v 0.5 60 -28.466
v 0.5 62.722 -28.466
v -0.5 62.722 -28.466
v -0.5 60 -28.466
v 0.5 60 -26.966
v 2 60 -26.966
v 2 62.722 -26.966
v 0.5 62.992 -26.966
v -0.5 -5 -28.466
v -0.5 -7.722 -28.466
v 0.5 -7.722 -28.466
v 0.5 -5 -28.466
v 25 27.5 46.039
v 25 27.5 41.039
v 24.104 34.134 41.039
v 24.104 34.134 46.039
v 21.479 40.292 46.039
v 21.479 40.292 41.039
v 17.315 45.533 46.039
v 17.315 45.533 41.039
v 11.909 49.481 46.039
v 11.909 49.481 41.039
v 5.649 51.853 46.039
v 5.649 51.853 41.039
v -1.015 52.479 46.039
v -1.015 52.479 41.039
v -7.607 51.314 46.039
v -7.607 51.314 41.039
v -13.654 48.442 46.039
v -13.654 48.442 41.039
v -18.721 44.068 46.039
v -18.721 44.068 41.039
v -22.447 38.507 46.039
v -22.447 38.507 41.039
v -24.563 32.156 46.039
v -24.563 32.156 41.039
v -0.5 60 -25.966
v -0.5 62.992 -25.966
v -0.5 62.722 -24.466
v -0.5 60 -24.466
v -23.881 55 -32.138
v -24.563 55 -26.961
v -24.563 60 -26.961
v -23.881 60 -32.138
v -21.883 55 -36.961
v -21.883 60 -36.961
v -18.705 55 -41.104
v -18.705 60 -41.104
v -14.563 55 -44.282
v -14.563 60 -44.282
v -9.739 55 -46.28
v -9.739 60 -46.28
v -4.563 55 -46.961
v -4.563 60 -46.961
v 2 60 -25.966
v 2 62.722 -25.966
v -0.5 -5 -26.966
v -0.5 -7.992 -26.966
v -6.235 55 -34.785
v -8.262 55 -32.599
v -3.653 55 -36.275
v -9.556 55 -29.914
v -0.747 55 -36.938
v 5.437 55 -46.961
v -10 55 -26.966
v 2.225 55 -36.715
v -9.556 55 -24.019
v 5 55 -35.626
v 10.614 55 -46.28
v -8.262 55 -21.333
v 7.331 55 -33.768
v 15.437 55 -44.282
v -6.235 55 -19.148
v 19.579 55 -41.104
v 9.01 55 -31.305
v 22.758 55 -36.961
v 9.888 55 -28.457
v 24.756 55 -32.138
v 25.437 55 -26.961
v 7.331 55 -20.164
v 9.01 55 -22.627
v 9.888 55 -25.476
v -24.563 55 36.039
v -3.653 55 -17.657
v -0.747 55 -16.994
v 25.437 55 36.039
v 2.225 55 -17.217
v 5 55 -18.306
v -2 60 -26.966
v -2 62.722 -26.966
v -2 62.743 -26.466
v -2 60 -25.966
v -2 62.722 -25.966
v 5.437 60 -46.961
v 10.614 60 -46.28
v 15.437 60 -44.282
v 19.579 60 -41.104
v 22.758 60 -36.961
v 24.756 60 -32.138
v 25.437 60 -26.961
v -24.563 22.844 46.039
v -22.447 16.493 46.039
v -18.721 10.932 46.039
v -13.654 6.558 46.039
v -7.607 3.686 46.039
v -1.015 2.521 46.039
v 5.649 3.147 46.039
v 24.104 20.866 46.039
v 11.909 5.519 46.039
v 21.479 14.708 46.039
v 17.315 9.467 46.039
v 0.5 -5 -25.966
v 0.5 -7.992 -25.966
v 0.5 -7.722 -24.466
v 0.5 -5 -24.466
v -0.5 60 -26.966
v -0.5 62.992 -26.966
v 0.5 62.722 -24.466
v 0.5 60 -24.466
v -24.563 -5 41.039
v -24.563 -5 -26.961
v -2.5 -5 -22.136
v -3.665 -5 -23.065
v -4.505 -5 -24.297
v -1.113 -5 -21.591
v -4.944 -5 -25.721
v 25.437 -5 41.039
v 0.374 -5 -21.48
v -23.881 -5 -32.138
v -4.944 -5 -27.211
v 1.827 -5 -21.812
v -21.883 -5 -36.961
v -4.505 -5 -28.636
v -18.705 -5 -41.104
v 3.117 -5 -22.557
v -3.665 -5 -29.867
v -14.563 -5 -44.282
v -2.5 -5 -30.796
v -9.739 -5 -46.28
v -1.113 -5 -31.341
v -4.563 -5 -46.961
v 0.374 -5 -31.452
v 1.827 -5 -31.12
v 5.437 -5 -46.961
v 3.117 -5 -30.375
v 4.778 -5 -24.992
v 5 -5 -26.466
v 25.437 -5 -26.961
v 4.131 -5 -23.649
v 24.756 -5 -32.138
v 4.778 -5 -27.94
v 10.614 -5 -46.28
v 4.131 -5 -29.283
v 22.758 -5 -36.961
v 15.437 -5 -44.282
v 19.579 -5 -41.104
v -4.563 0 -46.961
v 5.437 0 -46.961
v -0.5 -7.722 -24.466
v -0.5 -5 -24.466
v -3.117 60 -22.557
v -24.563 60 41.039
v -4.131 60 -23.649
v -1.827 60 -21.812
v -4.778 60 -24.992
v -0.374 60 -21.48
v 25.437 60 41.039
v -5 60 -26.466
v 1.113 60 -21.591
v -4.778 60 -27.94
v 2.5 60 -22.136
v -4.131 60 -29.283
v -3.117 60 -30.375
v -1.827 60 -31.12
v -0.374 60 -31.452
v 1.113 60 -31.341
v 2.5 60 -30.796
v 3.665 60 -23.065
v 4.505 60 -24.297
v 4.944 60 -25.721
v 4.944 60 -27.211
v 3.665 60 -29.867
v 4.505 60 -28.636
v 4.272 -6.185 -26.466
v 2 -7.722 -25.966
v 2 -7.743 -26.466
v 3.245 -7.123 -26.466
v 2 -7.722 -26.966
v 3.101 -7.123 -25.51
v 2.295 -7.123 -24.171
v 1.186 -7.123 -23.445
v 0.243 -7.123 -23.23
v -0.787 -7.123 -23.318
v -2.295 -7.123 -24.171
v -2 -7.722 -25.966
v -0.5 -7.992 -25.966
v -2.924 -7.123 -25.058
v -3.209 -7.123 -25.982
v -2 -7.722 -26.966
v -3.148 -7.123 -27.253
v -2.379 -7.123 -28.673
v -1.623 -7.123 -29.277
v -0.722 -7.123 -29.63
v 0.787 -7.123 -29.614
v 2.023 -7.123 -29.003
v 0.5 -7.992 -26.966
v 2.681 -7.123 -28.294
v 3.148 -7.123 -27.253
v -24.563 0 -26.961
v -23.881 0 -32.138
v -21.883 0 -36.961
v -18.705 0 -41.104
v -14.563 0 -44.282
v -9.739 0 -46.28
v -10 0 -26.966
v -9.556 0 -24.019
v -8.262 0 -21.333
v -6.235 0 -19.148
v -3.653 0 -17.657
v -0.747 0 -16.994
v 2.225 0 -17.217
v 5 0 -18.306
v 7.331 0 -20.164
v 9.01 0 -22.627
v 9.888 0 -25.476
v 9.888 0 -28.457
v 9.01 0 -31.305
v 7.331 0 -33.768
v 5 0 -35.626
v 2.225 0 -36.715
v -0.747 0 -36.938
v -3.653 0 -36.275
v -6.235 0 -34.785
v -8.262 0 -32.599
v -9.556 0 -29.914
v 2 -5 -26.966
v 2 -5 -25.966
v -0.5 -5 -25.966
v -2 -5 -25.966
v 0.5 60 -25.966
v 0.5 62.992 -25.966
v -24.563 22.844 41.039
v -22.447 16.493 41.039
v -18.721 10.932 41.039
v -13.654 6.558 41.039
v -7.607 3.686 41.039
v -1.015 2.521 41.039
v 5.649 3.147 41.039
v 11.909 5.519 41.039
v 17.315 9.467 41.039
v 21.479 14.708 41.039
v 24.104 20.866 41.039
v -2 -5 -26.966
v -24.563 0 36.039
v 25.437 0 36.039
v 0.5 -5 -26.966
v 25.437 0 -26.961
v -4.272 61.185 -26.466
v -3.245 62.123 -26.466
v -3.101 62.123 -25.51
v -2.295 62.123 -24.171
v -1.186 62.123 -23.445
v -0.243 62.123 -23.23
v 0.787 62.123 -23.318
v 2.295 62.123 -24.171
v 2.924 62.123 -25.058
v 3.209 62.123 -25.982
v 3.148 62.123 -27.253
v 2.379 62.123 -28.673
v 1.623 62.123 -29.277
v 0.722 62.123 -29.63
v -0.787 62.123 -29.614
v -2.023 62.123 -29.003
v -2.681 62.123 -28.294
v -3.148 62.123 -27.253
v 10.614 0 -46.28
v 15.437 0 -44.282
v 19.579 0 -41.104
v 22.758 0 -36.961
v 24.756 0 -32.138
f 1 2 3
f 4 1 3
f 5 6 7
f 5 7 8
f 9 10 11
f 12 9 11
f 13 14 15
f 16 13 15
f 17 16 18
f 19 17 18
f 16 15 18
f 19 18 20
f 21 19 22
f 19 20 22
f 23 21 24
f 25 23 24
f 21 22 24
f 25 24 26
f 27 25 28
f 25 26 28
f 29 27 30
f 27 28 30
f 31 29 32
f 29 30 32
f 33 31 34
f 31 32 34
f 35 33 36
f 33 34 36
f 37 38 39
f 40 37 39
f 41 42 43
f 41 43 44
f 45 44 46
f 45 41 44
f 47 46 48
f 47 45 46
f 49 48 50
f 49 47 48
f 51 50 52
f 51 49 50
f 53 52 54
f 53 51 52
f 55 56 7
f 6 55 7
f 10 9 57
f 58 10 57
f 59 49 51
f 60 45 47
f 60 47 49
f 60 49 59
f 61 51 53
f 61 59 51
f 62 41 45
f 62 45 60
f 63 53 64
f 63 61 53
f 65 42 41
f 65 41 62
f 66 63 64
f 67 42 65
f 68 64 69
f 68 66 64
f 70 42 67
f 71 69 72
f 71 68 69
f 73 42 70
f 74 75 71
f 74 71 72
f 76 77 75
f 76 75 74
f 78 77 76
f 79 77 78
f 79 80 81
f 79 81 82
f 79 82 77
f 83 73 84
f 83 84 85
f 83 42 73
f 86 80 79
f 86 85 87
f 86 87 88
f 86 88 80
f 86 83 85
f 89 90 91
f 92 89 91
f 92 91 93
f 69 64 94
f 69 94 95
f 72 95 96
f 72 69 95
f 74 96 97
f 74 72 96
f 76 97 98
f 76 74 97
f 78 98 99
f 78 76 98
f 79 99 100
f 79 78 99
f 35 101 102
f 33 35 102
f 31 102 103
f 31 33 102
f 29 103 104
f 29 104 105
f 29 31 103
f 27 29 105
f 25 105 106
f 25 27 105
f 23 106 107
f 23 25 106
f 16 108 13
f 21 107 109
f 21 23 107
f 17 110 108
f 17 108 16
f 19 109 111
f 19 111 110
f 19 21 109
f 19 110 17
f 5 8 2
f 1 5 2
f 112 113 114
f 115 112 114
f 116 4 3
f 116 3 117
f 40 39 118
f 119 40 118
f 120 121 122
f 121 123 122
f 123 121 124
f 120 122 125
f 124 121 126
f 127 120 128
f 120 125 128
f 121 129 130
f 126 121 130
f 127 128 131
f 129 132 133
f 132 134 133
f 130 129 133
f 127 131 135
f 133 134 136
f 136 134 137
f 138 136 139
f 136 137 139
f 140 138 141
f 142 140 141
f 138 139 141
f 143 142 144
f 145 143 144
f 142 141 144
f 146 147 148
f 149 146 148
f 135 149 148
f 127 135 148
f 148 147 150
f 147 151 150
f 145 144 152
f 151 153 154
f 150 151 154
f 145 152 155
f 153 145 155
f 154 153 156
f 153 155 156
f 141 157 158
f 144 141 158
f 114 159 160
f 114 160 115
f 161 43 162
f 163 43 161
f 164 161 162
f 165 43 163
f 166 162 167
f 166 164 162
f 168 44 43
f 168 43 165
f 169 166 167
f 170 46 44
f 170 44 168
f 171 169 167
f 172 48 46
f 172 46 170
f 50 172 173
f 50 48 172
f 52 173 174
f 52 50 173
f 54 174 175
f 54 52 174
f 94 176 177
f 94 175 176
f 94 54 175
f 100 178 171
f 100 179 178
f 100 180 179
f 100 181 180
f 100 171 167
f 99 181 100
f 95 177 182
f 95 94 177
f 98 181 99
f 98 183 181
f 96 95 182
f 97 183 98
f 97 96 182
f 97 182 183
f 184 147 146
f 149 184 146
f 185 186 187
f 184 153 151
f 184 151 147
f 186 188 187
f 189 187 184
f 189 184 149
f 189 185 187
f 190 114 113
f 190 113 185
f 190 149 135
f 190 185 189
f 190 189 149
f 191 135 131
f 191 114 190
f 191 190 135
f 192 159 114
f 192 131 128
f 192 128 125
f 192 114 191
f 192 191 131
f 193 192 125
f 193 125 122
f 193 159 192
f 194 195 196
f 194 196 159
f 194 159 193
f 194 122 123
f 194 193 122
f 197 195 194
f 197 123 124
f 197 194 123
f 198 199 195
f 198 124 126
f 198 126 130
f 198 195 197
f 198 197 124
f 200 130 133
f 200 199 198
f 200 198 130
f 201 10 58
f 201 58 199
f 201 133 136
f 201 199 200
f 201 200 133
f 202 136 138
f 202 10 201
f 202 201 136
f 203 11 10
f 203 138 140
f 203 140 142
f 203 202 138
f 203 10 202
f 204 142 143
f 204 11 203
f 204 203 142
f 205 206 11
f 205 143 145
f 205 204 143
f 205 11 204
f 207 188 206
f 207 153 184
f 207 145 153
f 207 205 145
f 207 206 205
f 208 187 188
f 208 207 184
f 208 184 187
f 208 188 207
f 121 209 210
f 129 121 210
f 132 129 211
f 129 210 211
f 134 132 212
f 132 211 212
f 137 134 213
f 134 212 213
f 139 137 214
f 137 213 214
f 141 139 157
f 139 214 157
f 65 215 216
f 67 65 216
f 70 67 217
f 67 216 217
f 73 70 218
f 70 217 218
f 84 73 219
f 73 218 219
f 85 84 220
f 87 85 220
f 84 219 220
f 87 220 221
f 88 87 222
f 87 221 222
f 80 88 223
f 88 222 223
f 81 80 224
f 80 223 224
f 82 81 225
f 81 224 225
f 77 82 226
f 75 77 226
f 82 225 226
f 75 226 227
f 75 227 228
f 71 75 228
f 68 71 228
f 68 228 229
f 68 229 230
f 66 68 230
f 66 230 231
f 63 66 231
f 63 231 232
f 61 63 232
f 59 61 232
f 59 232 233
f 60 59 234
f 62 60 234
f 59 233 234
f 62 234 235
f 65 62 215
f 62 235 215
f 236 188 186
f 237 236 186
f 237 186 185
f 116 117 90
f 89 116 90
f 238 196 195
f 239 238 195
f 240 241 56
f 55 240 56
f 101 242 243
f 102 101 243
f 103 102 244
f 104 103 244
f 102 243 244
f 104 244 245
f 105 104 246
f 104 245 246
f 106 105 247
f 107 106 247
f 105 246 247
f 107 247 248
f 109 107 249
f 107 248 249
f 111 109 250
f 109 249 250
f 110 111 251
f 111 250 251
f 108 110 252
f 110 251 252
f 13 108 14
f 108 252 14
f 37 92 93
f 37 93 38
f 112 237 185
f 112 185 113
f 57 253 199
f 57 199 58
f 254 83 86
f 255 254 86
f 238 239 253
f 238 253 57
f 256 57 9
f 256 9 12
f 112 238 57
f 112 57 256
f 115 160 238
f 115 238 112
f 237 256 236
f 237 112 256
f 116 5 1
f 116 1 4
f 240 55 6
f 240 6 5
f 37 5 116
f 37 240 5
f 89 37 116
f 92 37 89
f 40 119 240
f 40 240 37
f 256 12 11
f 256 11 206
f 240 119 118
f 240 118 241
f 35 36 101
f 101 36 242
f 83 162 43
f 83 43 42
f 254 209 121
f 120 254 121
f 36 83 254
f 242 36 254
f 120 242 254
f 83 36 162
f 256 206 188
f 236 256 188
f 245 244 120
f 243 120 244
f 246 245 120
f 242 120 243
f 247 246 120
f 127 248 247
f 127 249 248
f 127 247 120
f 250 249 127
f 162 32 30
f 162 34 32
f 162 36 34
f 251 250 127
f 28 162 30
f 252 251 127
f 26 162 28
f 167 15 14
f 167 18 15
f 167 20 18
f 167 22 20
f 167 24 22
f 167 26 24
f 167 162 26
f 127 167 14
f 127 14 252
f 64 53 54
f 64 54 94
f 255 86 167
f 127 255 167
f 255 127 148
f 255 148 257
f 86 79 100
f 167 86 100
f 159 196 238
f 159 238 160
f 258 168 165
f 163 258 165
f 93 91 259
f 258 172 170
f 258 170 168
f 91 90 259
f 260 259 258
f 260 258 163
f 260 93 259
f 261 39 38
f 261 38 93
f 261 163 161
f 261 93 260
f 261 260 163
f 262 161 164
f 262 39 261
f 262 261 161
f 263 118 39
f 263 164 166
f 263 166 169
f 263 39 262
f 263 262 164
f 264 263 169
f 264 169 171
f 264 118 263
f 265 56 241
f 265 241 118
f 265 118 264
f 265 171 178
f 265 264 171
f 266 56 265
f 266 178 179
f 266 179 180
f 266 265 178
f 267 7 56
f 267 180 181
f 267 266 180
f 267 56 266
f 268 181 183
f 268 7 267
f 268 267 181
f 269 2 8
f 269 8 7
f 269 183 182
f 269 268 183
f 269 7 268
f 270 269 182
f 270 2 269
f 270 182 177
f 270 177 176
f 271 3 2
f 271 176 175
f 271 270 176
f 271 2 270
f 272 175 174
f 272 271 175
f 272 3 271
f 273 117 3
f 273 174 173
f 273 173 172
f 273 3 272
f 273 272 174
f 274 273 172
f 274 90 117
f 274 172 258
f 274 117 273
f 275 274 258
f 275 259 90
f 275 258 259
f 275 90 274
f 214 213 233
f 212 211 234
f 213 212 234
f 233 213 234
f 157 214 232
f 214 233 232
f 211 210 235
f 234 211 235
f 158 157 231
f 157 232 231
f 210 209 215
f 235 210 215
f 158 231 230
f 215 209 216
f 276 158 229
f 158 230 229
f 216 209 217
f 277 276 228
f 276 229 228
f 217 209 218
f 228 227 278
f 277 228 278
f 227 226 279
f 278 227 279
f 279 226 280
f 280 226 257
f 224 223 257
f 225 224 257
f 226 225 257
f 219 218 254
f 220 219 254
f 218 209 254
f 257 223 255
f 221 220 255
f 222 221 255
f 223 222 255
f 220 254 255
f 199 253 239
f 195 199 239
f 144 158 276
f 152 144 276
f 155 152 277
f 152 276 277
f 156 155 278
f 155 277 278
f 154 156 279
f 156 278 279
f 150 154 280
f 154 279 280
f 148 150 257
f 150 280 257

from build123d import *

# Parameters (mm, degrees)
F1_DEPTH  = 5
F2_W      = 50
F2_H      = 55
F2_H_2    = 5
F3_DEPTH  = 5
F7_DEPTH  = 5
F8_R      = 10
F9_DEPTH  = 55
F10_R     = 5
F11_DEPTH = 3
F12_W     = 1.5
F12_H     = 1
F12_W_2   = 1
F12_H_2   = 1.5
F14_DEPTH = 3
F15_R     = 5
F16_DEPTH = 3
F18_DEPTH = 3


# Not quite as in the source:
# - a fillet or chamfer that OpenCascade refuses, or shapes differently, is made with other operations: its cross-section is extruded or revolved along the edge and cut away or added


with BuildPart() as f1:
    # F0 (on Front) → F1 (new body)
    with BuildSketch(Plane.XZ):
        with BuildLine():
            Line((25.4373252392, 36.0385786295), (-24.5626747608, 36.0385786295))
            Line((-24.5626747608, 36.0385786295), (-24.5626747608, -26.9614213705))
            ThreePointArc((-24.5626747608, -26.9614213705), (-18.7048103845, -41.1035569942), (-4.5626747608, -46.9614213705))
            Line((-4.5626747608, -46.9614213705), (5.4373252392, -46.9614213705))
            ThreePointArc((5.4373252392, -46.9614213705), (19.5794608629, -41.1035569942), (25.4373252392, -26.9614213705))
            Line((25.4373252392, -26.9614213705), (25.4373252392, 36.0385786295))
        make_face()
    extrude(amount=F1_DEPTH)

    # F2 (on face) → F3 (join)
    with BuildSketch(Plane.XY.offset(36.0385786295)):
        with Locations((0.4373252392, 27.5)):
            Rectangle(F2_W, F2_H)
        with Locations((0.4373252392, -2.5)):
            Rectangle(F2_W, F2_H_2)
    extrude(amount=F3_DEPTH)

    # F5: F1 across plane


with BuildPart() as f1_1:
    add(f1.part)
    add(f1.part.mirror(Plane(origin=(0.4373252392, 27.5, -3.8633044256), x_dir=(1, 0, 0), z_dir=(0, 1, 0))))

    # F6 (on face) → F7 (join)
    with BuildSketch(Plane.XY.offset(41.0385786295)):
        with BuildLine():
            ThreePointArc((-24.5626747608, 22.8443573382), (2.3380687521, 2.6095714278), (25, 27.5))
            ThreePointArc((25, 27.5), (2.3380687521, 52.3904285722), (-24.5626747608, 32.1556426618))
            Line((-24.5626747608, 32.1556426618), (-24.5626747608, 22.8443573382))
        make_face()
    extrude(amount=F7_DEPTH)

    # F8 (on face) → F9 (join, through all)
    with BuildSketch(Plane(origin=(0, 0, 0), x_dir=(-1, 0, 0), z_dir=(0, 1, 0))):
        with Locations((0, -26.9662032763)):
            Circle(F8_R)
    extrude(amount=F9_DEPTH)

    # F10 (on face) → F11 (join)
    with BuildSketch(Plane.XZ.offset(5)):
        with Locations((0, -26.4660866176)):
            Circle(F10_R)
    extrude(amount=F11_DEPTH)

    # F13: fillet of radius 5 on 1 edges, made by hand

    # F13_s1 → F13_t2 (revolve, cut)
    with BuildSketch(Plane.XY.offset(-26.4660866176)):
        with BuildLine():
            ThreePointArc((5, -5), (3.1560370926, -7.1833001327), (0.417424305, -8))
            Line((0.417424305, -8), (5, -8))
            Line((5, -8), (5, -5))
        make_face()
    revolve(axis=Axis((0, -8, -26.4660866176), (0, -1, 0)), mode=Mode.SUBTRACT)

    # F12 (on face) → F14 (cut)
    with BuildSketch(Plane.XZ.offset(8)):
        with Locations((-1.25, -26.4660866176)):
            Rectangle(F12_W, F12_H)
        Polygon((1, -25.9660866176), (0.5, -25.9660866176), (0.5, -26.9660866176), (1, -26.9660866176), (2, -26.9660866176), (2, -25.9660866176), align=None)
        with Locations((0, -26.4660866176)):
            Rectangle(F12_W_2, F12_H)
        with Locations((0, -25.2160866176)):
            Rectangle(F12_W_2, F12_H_2)
        with Locations((0, -27.7160866176)):
            Rectangle(F12_W_2, F12_H_2)
    extrude(amount=-F14_DEPTH, mode=Mode.SUBTRACT)

    # F15 (on face) → F16 (join)
    with BuildSketch(Plane(origin=(0, 60, 0), x_dir=(-1, 0, 0), z_dir=(0, 1, 0))):
        with Locations((0, -26.4660866176)):
            Circle(F15_R)
    extrude(amount=F16_DEPTH)

    # F17 (on face) → F18 (cut)
    with BuildSketch(Plane(origin=(0, 63, 0), x_dir=(-1, 0, 0), z_dir=(0, 1, 0))):
        Polygon((0.5, -24.4660866176), (-0.5, -24.4660866176), (-0.5, -25.9660866176), (-2, -25.9660866176), (-2, -26.9660866176), (-0.5, -26.9660866176), (-0.5, -28.4660866176), (0.5, -28.4660866176), (0.5, -26.9660866176), (2, -26.9660866176), (2, -25.9660866176), (0.5, -25.9660866176), align=None)
    extrude(amount=-F18_DEPTH, mode=Mode.SUBTRACT)

    # F19: fillet of radius 5 on 1 edges, made by hand

    # F19_s1 → F19_t2 (revolve, cut)
    with BuildSketch(Plane.XY.offset(-26.4660866176)):
        with BuildLine():
            ThreePointArc((-5, 60), (-3.1560370926, 62.1833001327), (-0.417424305, 63))
            Line((-0.417424305, 63), (-5, 63))
            Line((-5, 63), (-5, 60))
        make_face()
    revolve(axis=Axis((0, 63, -26.4660866176), (0, 1, 0)), mode=Mode.SUBTRACT)


solid = f1_1.part
